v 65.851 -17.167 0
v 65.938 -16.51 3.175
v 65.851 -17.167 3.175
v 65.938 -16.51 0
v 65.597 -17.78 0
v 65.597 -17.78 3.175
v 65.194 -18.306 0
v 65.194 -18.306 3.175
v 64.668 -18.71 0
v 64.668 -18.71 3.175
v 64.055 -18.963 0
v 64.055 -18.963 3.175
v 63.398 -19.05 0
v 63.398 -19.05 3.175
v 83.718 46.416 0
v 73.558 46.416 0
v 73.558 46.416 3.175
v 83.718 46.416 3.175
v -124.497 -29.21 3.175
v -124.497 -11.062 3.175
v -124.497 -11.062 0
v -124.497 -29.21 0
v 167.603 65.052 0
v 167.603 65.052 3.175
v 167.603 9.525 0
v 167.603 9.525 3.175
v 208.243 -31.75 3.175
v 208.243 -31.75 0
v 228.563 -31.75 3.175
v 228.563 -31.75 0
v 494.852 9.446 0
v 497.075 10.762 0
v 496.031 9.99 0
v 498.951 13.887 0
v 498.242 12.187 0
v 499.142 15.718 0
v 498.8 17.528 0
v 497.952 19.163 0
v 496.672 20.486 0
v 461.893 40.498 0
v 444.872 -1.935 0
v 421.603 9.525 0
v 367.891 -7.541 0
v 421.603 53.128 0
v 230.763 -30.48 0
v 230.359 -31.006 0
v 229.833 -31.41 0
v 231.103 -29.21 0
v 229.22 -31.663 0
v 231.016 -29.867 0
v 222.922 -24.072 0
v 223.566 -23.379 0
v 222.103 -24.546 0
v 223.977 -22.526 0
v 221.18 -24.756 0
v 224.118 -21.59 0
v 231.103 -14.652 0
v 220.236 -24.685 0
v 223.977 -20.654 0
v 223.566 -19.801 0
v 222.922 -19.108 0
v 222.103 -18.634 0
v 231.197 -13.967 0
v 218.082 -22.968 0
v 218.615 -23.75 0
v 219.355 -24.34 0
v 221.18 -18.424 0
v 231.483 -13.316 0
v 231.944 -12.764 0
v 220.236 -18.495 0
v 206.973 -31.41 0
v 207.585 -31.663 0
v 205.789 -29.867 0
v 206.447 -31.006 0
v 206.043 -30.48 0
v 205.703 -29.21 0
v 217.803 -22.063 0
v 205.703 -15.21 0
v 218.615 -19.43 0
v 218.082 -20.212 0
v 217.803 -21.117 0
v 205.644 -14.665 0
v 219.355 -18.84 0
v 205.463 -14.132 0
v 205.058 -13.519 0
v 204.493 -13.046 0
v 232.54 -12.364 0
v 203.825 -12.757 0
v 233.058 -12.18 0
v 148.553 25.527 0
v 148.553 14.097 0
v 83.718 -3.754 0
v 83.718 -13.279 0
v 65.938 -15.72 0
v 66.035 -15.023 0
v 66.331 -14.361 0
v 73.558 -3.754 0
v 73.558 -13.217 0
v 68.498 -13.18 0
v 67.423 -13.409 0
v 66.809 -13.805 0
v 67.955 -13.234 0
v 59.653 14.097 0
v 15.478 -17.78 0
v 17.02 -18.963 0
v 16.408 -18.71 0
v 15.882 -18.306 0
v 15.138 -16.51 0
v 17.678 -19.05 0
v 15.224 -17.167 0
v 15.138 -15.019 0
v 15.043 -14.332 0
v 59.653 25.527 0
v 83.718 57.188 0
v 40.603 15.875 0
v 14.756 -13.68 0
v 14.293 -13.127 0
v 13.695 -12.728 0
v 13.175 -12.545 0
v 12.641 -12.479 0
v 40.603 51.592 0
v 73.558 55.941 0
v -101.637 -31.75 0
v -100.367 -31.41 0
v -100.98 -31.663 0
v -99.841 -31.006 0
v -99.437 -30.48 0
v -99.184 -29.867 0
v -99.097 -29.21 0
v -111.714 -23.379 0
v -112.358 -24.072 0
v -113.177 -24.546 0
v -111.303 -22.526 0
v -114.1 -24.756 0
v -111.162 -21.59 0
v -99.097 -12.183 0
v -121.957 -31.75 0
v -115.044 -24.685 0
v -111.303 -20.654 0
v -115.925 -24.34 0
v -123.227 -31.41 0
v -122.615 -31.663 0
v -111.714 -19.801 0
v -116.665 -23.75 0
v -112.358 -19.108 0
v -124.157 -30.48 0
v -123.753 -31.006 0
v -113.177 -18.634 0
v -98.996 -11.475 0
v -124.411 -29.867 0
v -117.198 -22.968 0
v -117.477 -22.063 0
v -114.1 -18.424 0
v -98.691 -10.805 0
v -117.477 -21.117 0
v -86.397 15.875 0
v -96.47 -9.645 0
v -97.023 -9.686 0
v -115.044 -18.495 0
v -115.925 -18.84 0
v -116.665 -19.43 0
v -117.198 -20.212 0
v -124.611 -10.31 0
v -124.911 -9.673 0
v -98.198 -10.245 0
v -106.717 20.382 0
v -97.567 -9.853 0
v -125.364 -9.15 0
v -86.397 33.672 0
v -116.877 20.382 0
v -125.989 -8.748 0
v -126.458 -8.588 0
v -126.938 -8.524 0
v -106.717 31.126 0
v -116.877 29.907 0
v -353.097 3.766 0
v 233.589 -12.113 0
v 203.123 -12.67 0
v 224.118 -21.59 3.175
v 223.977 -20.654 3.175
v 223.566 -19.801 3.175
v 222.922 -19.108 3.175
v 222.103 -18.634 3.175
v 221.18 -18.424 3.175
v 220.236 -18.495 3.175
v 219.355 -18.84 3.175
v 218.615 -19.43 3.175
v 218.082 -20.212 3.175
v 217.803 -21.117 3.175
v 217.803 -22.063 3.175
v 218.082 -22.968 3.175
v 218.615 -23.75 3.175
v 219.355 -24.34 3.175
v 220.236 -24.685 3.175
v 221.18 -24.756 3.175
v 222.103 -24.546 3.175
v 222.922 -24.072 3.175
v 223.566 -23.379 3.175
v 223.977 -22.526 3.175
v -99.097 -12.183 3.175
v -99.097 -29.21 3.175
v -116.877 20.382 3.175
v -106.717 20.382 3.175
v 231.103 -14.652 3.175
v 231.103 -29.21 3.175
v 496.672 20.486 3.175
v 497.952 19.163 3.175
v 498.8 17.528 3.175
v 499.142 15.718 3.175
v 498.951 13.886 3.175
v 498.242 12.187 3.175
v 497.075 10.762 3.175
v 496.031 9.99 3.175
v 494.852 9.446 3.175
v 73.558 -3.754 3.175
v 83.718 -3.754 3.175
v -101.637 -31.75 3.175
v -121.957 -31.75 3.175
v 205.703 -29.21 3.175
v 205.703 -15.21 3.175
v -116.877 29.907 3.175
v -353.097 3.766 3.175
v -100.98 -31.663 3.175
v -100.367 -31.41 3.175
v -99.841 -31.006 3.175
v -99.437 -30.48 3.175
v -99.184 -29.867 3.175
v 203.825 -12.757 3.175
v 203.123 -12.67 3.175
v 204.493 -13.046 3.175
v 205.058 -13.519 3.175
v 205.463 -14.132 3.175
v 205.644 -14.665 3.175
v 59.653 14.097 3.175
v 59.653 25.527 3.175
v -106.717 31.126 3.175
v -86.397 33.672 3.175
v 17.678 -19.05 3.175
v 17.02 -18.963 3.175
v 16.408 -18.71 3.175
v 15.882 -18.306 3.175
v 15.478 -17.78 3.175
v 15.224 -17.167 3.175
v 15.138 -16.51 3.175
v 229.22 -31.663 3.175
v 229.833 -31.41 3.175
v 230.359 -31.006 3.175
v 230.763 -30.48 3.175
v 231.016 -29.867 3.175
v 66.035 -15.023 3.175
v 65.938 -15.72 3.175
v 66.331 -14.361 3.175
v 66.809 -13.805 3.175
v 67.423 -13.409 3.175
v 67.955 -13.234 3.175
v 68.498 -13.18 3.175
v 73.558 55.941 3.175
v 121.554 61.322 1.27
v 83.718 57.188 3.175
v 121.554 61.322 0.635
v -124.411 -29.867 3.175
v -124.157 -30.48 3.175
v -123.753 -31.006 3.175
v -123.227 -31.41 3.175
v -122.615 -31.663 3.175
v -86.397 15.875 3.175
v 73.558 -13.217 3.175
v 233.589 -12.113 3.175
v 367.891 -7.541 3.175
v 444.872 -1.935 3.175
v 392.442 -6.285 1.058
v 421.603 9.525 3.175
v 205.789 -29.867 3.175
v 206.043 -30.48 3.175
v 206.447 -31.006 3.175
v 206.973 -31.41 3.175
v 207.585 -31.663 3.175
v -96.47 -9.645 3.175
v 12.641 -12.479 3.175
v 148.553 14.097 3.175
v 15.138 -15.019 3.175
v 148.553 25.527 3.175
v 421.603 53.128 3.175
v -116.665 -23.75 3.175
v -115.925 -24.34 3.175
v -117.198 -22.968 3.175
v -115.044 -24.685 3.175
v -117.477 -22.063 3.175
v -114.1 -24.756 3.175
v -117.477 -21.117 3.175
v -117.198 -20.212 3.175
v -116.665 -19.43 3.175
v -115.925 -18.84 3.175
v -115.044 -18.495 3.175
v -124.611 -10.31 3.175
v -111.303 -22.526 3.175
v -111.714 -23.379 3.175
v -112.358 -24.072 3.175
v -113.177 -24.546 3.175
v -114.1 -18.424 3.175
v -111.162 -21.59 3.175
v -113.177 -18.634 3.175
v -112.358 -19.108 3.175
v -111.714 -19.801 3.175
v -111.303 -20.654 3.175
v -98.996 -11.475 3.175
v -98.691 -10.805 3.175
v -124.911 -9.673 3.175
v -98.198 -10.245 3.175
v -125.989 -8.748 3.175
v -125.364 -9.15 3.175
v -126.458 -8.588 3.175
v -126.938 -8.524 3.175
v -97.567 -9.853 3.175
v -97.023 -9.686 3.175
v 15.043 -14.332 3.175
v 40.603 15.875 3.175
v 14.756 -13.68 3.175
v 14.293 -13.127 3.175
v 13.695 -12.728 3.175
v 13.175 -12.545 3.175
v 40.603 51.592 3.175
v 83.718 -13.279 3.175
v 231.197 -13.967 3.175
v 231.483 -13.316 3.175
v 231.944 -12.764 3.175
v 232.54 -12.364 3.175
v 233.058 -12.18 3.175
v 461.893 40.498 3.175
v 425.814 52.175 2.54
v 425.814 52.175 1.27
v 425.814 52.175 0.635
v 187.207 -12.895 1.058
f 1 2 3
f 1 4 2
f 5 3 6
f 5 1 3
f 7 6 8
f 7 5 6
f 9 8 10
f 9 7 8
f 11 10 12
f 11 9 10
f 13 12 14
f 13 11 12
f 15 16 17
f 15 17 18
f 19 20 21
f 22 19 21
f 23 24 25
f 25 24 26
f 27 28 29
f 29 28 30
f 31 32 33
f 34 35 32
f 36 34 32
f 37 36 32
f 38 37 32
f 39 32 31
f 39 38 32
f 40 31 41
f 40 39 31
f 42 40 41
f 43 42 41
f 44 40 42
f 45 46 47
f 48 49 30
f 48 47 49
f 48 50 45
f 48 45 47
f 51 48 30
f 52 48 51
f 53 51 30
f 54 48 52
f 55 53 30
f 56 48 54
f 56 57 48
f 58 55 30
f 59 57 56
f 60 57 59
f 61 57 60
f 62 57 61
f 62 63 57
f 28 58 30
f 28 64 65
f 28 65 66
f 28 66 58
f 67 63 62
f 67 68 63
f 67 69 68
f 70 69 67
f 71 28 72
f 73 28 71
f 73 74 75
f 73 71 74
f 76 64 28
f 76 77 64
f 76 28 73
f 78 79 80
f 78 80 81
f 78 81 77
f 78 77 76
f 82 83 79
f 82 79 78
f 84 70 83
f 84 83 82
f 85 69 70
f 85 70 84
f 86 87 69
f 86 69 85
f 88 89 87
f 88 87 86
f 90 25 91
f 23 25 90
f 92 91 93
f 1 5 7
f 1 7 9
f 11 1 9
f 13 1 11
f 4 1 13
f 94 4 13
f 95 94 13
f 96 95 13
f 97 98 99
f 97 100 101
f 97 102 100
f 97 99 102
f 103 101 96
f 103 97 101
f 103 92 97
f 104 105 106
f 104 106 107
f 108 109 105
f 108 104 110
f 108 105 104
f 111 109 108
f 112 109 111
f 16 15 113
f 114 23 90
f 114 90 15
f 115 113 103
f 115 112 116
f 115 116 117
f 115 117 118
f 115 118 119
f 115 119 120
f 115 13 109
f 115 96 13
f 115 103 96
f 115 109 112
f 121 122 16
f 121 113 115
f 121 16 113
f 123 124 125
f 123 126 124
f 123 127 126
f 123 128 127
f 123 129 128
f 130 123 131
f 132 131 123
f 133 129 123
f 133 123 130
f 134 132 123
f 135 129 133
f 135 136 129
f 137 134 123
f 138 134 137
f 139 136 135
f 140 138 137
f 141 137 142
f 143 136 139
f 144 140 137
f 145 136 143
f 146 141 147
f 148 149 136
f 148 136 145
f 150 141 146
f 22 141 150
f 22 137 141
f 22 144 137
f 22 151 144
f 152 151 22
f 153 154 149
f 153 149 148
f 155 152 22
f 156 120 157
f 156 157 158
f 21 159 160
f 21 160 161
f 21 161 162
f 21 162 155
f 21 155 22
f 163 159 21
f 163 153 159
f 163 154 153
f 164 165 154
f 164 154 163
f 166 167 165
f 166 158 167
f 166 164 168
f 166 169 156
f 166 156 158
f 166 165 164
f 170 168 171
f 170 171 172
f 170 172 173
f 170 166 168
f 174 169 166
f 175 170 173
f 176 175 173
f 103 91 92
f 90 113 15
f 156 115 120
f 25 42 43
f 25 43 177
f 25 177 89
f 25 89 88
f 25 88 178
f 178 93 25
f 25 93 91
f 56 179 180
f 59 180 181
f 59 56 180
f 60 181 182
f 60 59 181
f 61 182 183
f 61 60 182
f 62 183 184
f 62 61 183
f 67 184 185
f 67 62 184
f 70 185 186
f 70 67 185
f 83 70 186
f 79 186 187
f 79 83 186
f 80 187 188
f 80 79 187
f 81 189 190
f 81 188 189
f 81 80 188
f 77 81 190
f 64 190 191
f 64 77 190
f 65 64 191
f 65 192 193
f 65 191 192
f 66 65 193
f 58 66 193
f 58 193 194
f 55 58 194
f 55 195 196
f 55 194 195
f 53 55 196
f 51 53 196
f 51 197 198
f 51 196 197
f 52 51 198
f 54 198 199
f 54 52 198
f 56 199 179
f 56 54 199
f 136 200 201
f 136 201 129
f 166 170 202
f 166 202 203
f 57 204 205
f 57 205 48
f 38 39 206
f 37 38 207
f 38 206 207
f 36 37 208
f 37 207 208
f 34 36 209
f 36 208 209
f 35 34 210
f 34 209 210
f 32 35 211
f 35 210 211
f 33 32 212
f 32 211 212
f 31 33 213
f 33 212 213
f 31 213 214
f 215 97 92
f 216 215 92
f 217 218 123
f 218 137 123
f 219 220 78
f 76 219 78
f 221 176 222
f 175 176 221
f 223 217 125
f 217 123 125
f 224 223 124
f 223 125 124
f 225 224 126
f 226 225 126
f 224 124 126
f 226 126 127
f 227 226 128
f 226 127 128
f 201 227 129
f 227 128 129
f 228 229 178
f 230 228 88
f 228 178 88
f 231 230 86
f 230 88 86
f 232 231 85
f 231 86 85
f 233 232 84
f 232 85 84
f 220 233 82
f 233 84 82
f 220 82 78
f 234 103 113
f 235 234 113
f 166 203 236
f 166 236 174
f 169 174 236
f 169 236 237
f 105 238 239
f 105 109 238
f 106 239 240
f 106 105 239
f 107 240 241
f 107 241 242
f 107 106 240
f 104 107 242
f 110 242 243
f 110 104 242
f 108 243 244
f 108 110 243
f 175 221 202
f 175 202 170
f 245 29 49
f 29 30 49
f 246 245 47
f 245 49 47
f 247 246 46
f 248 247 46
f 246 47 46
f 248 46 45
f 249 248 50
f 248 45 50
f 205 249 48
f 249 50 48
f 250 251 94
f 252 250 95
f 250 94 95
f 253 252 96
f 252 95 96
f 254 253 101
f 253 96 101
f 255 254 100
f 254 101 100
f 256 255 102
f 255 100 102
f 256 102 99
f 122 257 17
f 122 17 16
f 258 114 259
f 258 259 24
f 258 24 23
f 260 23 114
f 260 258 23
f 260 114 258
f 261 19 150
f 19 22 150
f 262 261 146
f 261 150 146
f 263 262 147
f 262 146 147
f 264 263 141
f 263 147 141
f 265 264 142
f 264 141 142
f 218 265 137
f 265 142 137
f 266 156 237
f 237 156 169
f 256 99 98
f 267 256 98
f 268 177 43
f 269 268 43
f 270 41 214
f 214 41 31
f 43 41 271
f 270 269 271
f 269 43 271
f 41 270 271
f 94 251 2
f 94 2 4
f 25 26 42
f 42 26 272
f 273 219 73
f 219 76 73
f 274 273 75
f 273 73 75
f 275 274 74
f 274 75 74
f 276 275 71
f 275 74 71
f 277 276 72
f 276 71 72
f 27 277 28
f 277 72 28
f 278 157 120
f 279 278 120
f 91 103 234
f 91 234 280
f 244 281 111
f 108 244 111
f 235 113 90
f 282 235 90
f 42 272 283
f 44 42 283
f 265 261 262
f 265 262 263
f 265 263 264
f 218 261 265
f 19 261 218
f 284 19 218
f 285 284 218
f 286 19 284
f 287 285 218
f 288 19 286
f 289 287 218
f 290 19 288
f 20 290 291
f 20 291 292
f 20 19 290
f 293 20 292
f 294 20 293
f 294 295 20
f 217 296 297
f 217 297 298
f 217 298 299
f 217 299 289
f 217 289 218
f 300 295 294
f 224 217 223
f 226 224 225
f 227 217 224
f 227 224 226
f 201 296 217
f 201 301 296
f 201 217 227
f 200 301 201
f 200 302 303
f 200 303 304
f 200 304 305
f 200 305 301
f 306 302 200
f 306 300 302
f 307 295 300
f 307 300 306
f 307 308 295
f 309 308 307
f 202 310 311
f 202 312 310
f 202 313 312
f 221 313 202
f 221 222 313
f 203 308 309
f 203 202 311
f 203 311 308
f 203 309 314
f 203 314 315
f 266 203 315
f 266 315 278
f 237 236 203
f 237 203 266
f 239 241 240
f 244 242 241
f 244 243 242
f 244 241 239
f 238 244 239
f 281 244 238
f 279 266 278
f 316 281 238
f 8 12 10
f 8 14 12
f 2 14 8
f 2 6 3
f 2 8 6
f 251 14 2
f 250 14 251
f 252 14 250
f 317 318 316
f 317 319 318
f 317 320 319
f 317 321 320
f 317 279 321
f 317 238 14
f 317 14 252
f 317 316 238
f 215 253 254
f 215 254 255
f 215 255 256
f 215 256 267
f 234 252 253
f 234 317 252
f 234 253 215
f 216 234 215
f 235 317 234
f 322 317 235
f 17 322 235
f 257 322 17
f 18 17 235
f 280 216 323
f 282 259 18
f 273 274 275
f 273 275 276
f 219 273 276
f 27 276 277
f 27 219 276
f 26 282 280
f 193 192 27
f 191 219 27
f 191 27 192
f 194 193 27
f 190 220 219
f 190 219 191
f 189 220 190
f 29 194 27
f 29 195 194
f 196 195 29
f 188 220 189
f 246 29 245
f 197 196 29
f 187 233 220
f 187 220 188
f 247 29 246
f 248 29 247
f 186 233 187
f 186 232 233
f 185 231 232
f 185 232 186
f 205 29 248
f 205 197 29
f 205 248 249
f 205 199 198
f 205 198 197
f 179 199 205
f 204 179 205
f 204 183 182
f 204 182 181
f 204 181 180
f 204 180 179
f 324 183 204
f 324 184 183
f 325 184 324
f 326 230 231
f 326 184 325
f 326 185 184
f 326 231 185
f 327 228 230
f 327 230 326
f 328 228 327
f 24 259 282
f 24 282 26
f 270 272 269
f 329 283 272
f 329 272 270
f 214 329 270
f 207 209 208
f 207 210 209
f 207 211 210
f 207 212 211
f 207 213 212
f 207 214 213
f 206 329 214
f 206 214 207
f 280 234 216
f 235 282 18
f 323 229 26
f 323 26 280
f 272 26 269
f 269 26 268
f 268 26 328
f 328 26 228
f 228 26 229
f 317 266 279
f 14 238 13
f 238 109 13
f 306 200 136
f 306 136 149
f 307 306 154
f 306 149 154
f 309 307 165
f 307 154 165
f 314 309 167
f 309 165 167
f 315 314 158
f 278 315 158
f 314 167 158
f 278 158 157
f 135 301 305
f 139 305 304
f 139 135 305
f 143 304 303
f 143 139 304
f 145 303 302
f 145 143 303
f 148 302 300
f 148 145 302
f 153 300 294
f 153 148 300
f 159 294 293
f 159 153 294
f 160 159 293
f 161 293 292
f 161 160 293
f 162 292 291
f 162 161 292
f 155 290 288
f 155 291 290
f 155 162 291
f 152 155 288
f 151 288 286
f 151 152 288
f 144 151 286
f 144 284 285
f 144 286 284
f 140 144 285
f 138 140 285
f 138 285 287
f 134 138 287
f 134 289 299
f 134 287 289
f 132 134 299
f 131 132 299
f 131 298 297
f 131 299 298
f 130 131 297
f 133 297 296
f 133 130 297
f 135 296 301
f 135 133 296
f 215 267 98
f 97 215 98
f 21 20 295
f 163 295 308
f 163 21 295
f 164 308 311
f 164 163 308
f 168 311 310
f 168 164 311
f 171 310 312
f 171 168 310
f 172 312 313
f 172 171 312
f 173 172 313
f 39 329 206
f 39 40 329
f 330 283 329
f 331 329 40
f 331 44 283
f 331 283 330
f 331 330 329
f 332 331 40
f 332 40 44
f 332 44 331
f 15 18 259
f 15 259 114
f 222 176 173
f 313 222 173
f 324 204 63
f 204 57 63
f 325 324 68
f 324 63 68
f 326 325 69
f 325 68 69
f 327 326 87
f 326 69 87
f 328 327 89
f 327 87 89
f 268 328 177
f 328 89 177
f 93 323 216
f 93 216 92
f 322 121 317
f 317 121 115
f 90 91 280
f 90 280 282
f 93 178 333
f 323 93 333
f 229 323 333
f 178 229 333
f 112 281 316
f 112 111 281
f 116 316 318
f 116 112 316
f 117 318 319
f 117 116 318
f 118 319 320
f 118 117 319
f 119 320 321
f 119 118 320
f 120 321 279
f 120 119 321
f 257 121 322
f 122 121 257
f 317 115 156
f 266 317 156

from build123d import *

# Parameters (mm, degrees)
BOSS_EXTRUDE1_DEPTH = 3.175
FILLET1_R           = 6.35
SKETCH6_W           = 88.9
SKETCH6_H           = 11.43
CUT_EXTRUDE3_DEPTH  = 5.08
SKETCH3_W           = 25.4
SKETCH3_H           = 3.175
BOSS_EXTRUDE2_DEPTH = 31.75
SKETCH3_3_W         = 50.8
SKETCH3_3_H         = 3.175
BOSS_EXTRUDE3_DEPTH = 19.05
FILLET2_R           = 2.54
CUT_EXTRUDE2_DEPTH  = 12.7
CUT_EXTRUDE4_DEPTH  = 5.08
SKETCH8_R           = 3.175
CUT_EXTRUDE5_DEPTH  = 504.378680986
CAVITY1_START       = 46.415619464
CAVITY1_OUTLINE_W   = 10.16
CAVITY1_OUTLINE_H   = 3.175
CAVITY1_DEPTH       = 10.772258138
CAVITY1_START_2     = 20.382459347
CAVITY1_2_OUTLINE_W = 10.16
CAVITY1_2_OUTLINE_H = 3.175
CAVITY1_2_DEPTH     = 10.743999494
CAVITY1_START_3     = -13.279272859
CAVITY1_3_OUTLINE_W = 10.16
CAVITY1_3_OUTLINE_H = 3.175
CAVITY1_3_DEPTH     = 9.525


# Read off the part's stored shape, not the designer's step: Cavity1
with BuildPart() as part:
    # Sketch1 → Boss-Extrude1 (new body)
    with BuildSketch(Plane.XY):
        with BuildLine():
            add(Edge.make_bspline(
                [(-353.097115344, 3.76640622), (-263.60988857, 15.489732087), (-103.405625954, 27.702523148), (139.625383809, 69.731889132), (320.600909148, 70.897971745), (447.029350736, 49.156772515), (484.461992977, 32.39779841), (505.225432444, 13.29140622)],
                knots=[0, 0, 0, 0, 0.308401543, 0.542913332, 0.850169973, 0.887176211, 1, 1, 1, 1], degree=3))
            add(Edge.make_bspline(
                [(-353.097115344, 3.76640622), (-171.204173065, -8.622681299), (70.681231732, -17.726989966), (367.634485174, -8.589262826), (467.934967897, -1.634661846), (505.225432444, 13.29140622)],
                knots=[0, 0, 0, 0, 0.625313044, 0.861778666, 1, 1, 1, 1], degree=3))
        make_face()
    extrude(amount=BOSS_EXTRUDE1_DEPTH)

    # Fillet1
    fillet1_edges = [part.edges().sort_by_distance(p)[0] for p in [
        (505.225432444, 13.29140622, 1.5875),
    ]]
    fillet(fillet1_edges, radius=FILLET1_R)

    # Sketch6 → Cut-Extrude3 (cut)
    with BuildSketch(Plane.XY):
        with Locations((104.102884656, 19.812)):
            Rectangle(SKETCH6_W, SKETCH6_H)
    extrude(amount=CUT_EXTRUDE3_DEPTH, mode=Mode.SUBTRACT)

    # Sketch3 → Boss-Extrude2 (add)
    with BuildSketch(Plane(origin=(0, 0, 0), x_dir=(1, 0, 0), z_dir=(0, 1, 0))):
        with Locations((-111.797115344, -1.5875)):
            Rectangle(SKETCH3_W, SKETCH3_H)
        with Locations((218.402884656, -1.5875)):
            Rectangle(SKETCH3_W, SKETCH3_H)
    extrude(amount=-BOSS_EXTRUDE2_DEPTH)

    # Sketch3<3> → Boss-Extrude3 (add)
    with BuildSketch(Plane(origin=(0, 0, 0), x_dir=(1, 0, 0), z_dir=(0, 1, 0))):
        with Locations((40.53772502, -1.5875)):
            Rectangle(SKETCH3_3_W, SKETCH3_3_H)
    extrude(amount=-BOSS_EXTRUDE3_DEPTH)

    # Fillet2
    fillet2_edges = [part.edges().sort_by_distance(p)[0] for p in [
        (-124.497115344, -8.618440951, 1.5875),
        (-99.097115344, -9.553641032, 1.5875),
        (205.702884656, -12.629236372, 1.5875),
        (231.102884656, -12.164410009, 1.5875),
        (15.13772502, -12.521395898, 1.5875),
        (65.93772502, -13.158984983, 1.5875),
        (-124.497115344, -31.75, 1.5875),
        (-99.097115344, -31.75, 1.5875),
        (15.13772502, -19.05, 1.5875),
        (65.93772502, -19.05, 1.5875),
        (205.702884656, -31.75, 1.5875),
        (231.102884656, -31.75, 1.5875),
    ]]
    fillet(fillet2_edges, radius=FILLET2_R)

    # Sketch5 → Cut-Extrude2 (cut, symmetric)
    with BuildSketch(Plane.XY):
        with BuildLine():
            Line((167.602884656, 9.525), (421.602884656, 9.525))
            Line((421.602884656, 9.525), (421.602884656, 53.128136288))
            add(Edge.make_bspline(
                [(167.602884656, 65.051503813), (244.722722107, 70.03272949), (333.181087562, 68.488590043), (412.953469478, 55.01226242), (421.602884656, 53.128136288)],
                knots=[0.603089435, 0.603089435, 0.603089435, 0.603089435, 0.862957728, 0.895261032, 0.895261032, 0.895261032, 0.895261032], degree=3))
            Line((167.602884656, 65.051503813), (167.602884656, 9.525))
        make_face()
    extrude(amount=CUT_EXTRUDE2_DEPTH, both=True, mode=Mode.SUBTRACT)

    # Sketch7 → Cut-Extrude4 (cut)
    with BuildSketch(Plane.XY):
        with BuildLine():
            Line((40.602884656, 51.591569772), (40.602884656, 15.875))
            Line((40.602884656, 15.875), (-86.397115344, 15.875))
            Line((-86.397115344, 15.875), (-86.397115344, 33.671872302))
            add(Edge.make_bspline(
                [(-86.397115344, 33.671872302), (-85.336997309, 33.80875443), (-42.923565209, 39.312219047), (-0.873657075, 45.877823306), (40.602884656, 51.591569772)],
                knots=[0.304745552, 0.304745552, 0.304745552, 0.304745552, 0.308401543, 0.451045815, 0.451045815, 0.451045815, 0.451045815], degree=3))
        make_face()
    extrude(amount=CUT_EXTRUDE4_DEPTH, mode=Mode.SUBTRACT)

    # Sketch8 → Cut-Extrude5 (cut, through all)
    with BuildSketch(Plane.XY):
        with Locations((220.942884656, -21.59)):
            Circle(SKETCH8_R)
        with Locations((-114.337115344, -21.59)):
            Circle(SKETCH8_R)
    extrude(amount=CUT_EXTRUDE5_DEPTH, mode=Mode.SUBTRACT)

    # Cavity1 outline → Cavity1 (cut)
    with BuildSketch(Plane(origin=(0, 0, 0), x_dir=(1, 0, 0), z_dir=(0, 1, 0)).offset(CAVITY1_START)):
        with Locations((78.637724966, -1.5875)):
            Rectangle(CAVITY1_OUTLINE_W, CAVITY1_OUTLINE_H)
    extrude(amount=CAVITY1_DEPTH, mode=Mode.SUBTRACT)

    # Cavity1 2 outline → Cavity1 2 (cut)
    with BuildSketch(Plane(origin=(0, 0, 0), x_dir=(1, 0, 0), z_dir=(0, 1, 0)).offset(CAVITY1_START_2)):
        with Locations((-111.797115344, -1.5875)):
            Rectangle(CAVITY1_2_OUTLINE_W, CAVITY1_2_OUTLINE_H)
    extrude(amount=CAVITY1_2_DEPTH, mode=Mode.SUBTRACT)

    # Cavity1 3 outline → Cavity1 3 (cut)
    with BuildSketch(Plane(origin=(0, 0, 0), x_dir=(1, 0, 0), z_dir=(0, 1, 0)).offset(CAVITY1_START_3)):
        with Locations((78.637724966, -1.5875)):
            Rectangle(CAVITY1_3_OUTLINE_W, CAVITY1_3_OUTLINE_H)
    extrude(amount=CAVITY1_3_DEPTH, mode=Mode.SUBTRACT)


solid = part.part
